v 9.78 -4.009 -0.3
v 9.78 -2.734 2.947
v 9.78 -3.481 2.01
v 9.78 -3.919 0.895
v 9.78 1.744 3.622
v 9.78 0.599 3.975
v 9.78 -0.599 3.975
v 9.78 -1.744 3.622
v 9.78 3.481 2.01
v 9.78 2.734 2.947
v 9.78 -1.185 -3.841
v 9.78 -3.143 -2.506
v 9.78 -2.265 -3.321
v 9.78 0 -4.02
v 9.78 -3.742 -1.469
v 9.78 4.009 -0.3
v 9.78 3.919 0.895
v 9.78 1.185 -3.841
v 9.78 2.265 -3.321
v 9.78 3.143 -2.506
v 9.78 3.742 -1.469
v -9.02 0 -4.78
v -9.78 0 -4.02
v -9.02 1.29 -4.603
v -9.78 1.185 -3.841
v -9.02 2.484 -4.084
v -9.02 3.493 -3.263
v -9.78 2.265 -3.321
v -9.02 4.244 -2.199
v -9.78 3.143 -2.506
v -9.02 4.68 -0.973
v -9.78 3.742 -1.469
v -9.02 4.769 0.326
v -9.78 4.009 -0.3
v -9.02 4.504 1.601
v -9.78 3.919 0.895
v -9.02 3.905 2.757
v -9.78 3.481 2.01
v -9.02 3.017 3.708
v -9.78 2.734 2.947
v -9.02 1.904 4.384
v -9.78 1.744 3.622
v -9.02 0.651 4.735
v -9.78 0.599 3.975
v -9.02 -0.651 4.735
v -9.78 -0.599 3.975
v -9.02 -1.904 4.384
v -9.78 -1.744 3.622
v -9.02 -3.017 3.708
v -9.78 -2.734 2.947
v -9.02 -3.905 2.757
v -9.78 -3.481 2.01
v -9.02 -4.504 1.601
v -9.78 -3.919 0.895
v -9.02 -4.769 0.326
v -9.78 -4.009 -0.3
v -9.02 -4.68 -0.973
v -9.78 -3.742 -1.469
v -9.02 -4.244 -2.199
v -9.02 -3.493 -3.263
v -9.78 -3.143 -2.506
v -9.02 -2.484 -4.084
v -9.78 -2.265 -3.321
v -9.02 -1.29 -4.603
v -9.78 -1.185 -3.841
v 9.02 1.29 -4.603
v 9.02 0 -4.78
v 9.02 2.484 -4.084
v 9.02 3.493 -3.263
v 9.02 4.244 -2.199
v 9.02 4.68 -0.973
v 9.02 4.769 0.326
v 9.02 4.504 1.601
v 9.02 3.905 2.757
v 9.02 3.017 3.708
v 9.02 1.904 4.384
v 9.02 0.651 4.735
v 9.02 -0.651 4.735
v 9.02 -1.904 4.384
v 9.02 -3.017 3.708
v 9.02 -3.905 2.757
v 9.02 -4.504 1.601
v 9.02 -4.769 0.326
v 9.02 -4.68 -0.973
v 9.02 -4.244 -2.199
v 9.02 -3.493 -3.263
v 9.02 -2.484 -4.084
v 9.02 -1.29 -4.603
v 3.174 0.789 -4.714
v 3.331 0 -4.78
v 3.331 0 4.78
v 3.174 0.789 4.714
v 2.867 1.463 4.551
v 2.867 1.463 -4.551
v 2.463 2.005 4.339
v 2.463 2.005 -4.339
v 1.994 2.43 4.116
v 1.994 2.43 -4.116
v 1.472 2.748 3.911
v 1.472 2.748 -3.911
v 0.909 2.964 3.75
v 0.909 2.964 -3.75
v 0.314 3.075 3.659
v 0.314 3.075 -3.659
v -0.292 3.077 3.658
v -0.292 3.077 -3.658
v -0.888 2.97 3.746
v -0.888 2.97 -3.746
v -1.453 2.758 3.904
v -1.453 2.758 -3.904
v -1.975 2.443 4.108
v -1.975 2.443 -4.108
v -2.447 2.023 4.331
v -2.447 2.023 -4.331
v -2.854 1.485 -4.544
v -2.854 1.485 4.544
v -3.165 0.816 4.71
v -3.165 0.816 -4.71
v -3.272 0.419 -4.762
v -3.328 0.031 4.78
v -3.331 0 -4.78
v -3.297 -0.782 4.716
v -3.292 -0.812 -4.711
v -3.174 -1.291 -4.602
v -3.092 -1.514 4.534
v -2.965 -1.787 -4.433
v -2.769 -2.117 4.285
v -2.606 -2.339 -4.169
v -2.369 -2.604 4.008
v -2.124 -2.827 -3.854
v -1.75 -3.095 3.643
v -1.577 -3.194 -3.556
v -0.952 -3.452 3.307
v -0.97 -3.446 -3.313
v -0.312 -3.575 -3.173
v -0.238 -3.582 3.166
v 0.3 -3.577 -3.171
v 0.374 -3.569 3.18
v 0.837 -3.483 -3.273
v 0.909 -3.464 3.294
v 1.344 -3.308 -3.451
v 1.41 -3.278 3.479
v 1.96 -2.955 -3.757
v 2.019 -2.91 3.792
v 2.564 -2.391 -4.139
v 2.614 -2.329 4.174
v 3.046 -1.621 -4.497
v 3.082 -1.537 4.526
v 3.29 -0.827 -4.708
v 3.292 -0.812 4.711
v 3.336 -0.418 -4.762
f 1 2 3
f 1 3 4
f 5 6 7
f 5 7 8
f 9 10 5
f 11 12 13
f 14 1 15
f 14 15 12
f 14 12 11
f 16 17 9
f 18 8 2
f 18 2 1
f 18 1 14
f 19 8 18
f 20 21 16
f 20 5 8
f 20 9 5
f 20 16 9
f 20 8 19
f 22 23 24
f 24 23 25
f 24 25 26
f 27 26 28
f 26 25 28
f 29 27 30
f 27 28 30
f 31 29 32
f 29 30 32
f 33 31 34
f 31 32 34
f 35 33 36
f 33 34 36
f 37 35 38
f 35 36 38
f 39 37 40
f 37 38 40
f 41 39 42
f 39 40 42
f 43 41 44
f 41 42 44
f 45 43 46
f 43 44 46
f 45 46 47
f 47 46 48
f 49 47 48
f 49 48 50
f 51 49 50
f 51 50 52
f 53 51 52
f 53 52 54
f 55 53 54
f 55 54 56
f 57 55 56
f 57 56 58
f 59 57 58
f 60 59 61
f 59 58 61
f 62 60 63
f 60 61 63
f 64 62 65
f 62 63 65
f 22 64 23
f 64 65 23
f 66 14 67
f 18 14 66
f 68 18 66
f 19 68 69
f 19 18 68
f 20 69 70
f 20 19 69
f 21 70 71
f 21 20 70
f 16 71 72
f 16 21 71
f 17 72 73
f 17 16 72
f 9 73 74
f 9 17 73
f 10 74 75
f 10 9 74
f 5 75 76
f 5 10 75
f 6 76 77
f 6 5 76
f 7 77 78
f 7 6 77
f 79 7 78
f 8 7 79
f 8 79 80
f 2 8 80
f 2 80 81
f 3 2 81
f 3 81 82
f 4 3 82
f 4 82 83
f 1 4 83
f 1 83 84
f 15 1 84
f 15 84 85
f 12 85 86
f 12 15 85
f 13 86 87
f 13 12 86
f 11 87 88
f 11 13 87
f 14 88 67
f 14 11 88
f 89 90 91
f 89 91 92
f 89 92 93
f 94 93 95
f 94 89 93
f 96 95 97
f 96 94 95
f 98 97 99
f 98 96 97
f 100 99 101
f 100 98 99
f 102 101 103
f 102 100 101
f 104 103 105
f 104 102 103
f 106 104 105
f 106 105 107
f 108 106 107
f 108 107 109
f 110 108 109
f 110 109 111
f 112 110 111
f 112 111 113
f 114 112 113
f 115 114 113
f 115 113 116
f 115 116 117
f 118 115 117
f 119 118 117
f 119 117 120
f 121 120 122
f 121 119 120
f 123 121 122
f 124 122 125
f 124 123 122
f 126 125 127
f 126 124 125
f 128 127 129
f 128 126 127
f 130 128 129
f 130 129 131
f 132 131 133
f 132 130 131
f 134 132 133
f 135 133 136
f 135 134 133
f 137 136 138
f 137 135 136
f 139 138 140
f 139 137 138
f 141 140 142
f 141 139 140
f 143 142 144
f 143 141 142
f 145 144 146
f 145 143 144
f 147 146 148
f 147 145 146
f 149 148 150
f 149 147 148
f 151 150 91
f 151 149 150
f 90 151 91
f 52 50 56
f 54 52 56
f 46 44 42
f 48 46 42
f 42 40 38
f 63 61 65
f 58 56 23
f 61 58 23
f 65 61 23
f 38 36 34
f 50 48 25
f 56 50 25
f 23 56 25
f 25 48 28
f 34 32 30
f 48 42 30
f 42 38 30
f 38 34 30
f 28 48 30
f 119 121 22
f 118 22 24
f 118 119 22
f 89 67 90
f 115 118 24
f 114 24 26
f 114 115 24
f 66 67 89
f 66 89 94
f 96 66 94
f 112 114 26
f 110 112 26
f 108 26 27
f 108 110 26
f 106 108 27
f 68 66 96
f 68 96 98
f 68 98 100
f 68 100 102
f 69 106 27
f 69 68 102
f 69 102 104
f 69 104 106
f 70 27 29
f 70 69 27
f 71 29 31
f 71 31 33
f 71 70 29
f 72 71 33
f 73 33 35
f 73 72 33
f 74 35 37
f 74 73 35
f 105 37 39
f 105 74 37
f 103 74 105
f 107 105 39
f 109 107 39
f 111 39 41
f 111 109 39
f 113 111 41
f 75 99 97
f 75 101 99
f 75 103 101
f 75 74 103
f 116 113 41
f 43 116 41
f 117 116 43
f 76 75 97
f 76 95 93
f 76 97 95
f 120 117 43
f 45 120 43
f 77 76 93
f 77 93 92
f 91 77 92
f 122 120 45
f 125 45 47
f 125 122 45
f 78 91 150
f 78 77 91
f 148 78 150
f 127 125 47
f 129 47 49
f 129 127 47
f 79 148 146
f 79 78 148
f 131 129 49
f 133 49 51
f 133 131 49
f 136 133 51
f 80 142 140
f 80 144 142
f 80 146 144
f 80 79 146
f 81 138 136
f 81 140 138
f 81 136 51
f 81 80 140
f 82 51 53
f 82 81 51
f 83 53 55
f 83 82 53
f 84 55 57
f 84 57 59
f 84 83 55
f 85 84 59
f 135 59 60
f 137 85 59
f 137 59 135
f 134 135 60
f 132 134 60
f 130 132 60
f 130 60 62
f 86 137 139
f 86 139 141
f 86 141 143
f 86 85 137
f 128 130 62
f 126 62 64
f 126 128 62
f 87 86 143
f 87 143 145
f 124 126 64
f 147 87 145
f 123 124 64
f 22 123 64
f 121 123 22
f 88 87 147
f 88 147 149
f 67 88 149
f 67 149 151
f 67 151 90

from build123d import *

# Parameters (mm, degrees)
SKETCH1_R               = 4.78
BOSS_EXTRUDE1_DEPTH     = 9.78
CUT_EXTRUDE1_DEPTH      = 12.888868743
CUT_EXTRUDE1_DEPTH_BACK = 12.888868743
SKETCH3_R               = 3.34
CHAMFER1_SIZE           = 0.76


with BuildPart() as part:
    # Sketch1 → Boss-Extrude1 (new, symmetric)
    with BuildSketch(Plane(origin=(0, 0, 0), x_dir=(0, 0, -1), z_dir=(1, 0, 0))):
        Circle(SKETCH1_R)
    extrude(amount=BOSS_EXTRUDE1_DEPTH, both=True)

    # Sketch3 → Cut-Extrude1 (cut, two sides: drawn at the far end of the back side and taken through both)
    with BuildSketch(Plane.XY.offset(-CUT_EXTRUDE1_DEPTH_BACK)):
        with Locations(Location((0, -0.25, 0), (0, 0, 4.292620915))):
            Circle(SKETCH3_R)
    extrude(amount=CUT_EXTRUDE1_DEPTH + CUT_EXTRUDE1_DEPTH_BACK, mode=Mode.SUBTRACT)

    # Chamfer1
    chamfer1_edges = [part.edges().sort_by_distance(p)[0] for p in [
        (-9.78, 0, 4.78),
        (9.78, 0, 4.78),
    ]]
    chamfer(chamfer1_edges, length=CHAMFER1_SIZE)


solid = part.part
